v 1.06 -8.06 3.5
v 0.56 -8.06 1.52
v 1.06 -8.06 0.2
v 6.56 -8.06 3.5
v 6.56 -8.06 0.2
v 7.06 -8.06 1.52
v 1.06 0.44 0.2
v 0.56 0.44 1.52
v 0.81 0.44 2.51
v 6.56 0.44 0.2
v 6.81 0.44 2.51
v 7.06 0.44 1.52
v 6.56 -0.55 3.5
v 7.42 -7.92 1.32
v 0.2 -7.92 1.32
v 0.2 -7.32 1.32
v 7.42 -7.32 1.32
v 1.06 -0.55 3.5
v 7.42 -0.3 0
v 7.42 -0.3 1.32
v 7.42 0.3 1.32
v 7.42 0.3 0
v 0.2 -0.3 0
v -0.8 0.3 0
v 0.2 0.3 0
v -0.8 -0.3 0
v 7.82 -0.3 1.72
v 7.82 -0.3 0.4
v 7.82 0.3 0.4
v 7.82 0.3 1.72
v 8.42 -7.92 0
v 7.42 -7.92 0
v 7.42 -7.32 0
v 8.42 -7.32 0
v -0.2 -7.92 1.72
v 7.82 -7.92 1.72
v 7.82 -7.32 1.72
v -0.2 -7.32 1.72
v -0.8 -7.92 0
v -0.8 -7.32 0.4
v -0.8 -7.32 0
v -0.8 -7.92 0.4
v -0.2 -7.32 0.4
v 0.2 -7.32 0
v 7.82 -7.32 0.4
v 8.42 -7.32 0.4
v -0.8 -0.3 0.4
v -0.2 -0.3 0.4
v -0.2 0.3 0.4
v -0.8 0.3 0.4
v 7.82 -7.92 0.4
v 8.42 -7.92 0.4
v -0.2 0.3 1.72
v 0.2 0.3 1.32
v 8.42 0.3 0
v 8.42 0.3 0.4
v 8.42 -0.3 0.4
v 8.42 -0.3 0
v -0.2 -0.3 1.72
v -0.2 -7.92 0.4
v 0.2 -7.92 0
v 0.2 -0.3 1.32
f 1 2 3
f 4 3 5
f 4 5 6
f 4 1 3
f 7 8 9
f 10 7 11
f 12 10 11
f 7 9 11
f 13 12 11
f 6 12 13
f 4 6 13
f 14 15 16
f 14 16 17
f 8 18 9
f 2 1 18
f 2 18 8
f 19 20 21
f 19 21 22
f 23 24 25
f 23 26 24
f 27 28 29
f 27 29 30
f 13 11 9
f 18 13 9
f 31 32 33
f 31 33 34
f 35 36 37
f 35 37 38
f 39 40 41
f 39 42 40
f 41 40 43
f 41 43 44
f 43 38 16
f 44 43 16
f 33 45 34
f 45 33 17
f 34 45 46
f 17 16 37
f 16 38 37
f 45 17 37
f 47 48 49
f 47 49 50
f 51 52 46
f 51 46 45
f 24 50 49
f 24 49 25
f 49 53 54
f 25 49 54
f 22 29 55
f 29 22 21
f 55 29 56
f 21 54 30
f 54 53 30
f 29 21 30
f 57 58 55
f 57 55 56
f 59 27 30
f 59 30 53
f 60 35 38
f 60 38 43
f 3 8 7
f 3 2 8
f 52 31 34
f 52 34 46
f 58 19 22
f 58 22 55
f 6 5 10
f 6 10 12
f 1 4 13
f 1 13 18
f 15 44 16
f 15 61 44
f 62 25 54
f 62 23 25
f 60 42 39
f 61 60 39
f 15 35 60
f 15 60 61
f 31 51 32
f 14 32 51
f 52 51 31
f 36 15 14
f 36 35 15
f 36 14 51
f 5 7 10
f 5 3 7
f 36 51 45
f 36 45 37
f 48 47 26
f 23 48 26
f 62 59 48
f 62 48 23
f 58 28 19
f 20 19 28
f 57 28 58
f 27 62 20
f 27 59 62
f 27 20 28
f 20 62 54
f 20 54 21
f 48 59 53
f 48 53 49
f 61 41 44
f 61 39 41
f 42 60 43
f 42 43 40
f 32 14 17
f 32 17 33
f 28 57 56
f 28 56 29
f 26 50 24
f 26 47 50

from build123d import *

# Parameters (mm, degrees)
PAD001_DEPTH = 0.3
PAD_DEPTH    = 4.25
CHAMFER_SIZE = 0.99
PAD002_DEPTH = 0.3


with BuildPart() as pad001:
    # Sketch001 → Pad001 (new body, symmetric)
    with BuildSketch(Plane.XZ):
        Polygon((-0.2, 0), (0.2, 0), (0.2, 1.32), (7.42, 1.32), (7.42, 0), (7.82, 0), (8.42, 0), (8.42, 0.4), (7.82, 0.4), (7.82, 1.72), (-0.2, 1.72), (-0.2, 0.4), (-0.8, 0.4), (-0.8, 0), align=None)
    extrude(amount=PAD001_DEPTH, both=True)


with BuildPart() as chamfer_body:
    # Sketch → Pad (new body, symmetric)
    with BuildSketch(Plane.XZ.offset(3.81)):
        Polygon((1.06, 0.2), (6.56, 0.2), (7.06, 1.52), (6.56, 3.5), (1.06, 3.5), (0.56, 1.52), align=None)
    extrude(amount=PAD_DEPTH, both=True)

    # Chamfer
    chamfer_edges = [chamfer_body.edges().sort_by_distance(p)[0] for p in [
        (3.81, 0.44, 3.5),
    ]]
    chamfer(chamfer_edges, length=CHAMFER_SIZE)


with BuildPart() as pad002:
    # Sketch002 → Pad002 (new body, symmetric)
    with BuildSketch(Plane.XZ.offset(7.62)):
        Polygon((-0.2, 0), (0.2, 0), (0.2, 1.32), (7.42, 1.32), (7.42, 0), (7.82, 0), (8.42, 0), (8.42, 0.4), (7.82, 0.4), (7.82, 1.72), (-0.2, 1.72), (-0.2, 0.4), (-0.8, 0.4), (-0.8, 0), align=None)
    extrude(amount=PAD002_DEPTH, both=True)


solid = Compound([pad001.part, chamfer_body.part, pad002.part])
